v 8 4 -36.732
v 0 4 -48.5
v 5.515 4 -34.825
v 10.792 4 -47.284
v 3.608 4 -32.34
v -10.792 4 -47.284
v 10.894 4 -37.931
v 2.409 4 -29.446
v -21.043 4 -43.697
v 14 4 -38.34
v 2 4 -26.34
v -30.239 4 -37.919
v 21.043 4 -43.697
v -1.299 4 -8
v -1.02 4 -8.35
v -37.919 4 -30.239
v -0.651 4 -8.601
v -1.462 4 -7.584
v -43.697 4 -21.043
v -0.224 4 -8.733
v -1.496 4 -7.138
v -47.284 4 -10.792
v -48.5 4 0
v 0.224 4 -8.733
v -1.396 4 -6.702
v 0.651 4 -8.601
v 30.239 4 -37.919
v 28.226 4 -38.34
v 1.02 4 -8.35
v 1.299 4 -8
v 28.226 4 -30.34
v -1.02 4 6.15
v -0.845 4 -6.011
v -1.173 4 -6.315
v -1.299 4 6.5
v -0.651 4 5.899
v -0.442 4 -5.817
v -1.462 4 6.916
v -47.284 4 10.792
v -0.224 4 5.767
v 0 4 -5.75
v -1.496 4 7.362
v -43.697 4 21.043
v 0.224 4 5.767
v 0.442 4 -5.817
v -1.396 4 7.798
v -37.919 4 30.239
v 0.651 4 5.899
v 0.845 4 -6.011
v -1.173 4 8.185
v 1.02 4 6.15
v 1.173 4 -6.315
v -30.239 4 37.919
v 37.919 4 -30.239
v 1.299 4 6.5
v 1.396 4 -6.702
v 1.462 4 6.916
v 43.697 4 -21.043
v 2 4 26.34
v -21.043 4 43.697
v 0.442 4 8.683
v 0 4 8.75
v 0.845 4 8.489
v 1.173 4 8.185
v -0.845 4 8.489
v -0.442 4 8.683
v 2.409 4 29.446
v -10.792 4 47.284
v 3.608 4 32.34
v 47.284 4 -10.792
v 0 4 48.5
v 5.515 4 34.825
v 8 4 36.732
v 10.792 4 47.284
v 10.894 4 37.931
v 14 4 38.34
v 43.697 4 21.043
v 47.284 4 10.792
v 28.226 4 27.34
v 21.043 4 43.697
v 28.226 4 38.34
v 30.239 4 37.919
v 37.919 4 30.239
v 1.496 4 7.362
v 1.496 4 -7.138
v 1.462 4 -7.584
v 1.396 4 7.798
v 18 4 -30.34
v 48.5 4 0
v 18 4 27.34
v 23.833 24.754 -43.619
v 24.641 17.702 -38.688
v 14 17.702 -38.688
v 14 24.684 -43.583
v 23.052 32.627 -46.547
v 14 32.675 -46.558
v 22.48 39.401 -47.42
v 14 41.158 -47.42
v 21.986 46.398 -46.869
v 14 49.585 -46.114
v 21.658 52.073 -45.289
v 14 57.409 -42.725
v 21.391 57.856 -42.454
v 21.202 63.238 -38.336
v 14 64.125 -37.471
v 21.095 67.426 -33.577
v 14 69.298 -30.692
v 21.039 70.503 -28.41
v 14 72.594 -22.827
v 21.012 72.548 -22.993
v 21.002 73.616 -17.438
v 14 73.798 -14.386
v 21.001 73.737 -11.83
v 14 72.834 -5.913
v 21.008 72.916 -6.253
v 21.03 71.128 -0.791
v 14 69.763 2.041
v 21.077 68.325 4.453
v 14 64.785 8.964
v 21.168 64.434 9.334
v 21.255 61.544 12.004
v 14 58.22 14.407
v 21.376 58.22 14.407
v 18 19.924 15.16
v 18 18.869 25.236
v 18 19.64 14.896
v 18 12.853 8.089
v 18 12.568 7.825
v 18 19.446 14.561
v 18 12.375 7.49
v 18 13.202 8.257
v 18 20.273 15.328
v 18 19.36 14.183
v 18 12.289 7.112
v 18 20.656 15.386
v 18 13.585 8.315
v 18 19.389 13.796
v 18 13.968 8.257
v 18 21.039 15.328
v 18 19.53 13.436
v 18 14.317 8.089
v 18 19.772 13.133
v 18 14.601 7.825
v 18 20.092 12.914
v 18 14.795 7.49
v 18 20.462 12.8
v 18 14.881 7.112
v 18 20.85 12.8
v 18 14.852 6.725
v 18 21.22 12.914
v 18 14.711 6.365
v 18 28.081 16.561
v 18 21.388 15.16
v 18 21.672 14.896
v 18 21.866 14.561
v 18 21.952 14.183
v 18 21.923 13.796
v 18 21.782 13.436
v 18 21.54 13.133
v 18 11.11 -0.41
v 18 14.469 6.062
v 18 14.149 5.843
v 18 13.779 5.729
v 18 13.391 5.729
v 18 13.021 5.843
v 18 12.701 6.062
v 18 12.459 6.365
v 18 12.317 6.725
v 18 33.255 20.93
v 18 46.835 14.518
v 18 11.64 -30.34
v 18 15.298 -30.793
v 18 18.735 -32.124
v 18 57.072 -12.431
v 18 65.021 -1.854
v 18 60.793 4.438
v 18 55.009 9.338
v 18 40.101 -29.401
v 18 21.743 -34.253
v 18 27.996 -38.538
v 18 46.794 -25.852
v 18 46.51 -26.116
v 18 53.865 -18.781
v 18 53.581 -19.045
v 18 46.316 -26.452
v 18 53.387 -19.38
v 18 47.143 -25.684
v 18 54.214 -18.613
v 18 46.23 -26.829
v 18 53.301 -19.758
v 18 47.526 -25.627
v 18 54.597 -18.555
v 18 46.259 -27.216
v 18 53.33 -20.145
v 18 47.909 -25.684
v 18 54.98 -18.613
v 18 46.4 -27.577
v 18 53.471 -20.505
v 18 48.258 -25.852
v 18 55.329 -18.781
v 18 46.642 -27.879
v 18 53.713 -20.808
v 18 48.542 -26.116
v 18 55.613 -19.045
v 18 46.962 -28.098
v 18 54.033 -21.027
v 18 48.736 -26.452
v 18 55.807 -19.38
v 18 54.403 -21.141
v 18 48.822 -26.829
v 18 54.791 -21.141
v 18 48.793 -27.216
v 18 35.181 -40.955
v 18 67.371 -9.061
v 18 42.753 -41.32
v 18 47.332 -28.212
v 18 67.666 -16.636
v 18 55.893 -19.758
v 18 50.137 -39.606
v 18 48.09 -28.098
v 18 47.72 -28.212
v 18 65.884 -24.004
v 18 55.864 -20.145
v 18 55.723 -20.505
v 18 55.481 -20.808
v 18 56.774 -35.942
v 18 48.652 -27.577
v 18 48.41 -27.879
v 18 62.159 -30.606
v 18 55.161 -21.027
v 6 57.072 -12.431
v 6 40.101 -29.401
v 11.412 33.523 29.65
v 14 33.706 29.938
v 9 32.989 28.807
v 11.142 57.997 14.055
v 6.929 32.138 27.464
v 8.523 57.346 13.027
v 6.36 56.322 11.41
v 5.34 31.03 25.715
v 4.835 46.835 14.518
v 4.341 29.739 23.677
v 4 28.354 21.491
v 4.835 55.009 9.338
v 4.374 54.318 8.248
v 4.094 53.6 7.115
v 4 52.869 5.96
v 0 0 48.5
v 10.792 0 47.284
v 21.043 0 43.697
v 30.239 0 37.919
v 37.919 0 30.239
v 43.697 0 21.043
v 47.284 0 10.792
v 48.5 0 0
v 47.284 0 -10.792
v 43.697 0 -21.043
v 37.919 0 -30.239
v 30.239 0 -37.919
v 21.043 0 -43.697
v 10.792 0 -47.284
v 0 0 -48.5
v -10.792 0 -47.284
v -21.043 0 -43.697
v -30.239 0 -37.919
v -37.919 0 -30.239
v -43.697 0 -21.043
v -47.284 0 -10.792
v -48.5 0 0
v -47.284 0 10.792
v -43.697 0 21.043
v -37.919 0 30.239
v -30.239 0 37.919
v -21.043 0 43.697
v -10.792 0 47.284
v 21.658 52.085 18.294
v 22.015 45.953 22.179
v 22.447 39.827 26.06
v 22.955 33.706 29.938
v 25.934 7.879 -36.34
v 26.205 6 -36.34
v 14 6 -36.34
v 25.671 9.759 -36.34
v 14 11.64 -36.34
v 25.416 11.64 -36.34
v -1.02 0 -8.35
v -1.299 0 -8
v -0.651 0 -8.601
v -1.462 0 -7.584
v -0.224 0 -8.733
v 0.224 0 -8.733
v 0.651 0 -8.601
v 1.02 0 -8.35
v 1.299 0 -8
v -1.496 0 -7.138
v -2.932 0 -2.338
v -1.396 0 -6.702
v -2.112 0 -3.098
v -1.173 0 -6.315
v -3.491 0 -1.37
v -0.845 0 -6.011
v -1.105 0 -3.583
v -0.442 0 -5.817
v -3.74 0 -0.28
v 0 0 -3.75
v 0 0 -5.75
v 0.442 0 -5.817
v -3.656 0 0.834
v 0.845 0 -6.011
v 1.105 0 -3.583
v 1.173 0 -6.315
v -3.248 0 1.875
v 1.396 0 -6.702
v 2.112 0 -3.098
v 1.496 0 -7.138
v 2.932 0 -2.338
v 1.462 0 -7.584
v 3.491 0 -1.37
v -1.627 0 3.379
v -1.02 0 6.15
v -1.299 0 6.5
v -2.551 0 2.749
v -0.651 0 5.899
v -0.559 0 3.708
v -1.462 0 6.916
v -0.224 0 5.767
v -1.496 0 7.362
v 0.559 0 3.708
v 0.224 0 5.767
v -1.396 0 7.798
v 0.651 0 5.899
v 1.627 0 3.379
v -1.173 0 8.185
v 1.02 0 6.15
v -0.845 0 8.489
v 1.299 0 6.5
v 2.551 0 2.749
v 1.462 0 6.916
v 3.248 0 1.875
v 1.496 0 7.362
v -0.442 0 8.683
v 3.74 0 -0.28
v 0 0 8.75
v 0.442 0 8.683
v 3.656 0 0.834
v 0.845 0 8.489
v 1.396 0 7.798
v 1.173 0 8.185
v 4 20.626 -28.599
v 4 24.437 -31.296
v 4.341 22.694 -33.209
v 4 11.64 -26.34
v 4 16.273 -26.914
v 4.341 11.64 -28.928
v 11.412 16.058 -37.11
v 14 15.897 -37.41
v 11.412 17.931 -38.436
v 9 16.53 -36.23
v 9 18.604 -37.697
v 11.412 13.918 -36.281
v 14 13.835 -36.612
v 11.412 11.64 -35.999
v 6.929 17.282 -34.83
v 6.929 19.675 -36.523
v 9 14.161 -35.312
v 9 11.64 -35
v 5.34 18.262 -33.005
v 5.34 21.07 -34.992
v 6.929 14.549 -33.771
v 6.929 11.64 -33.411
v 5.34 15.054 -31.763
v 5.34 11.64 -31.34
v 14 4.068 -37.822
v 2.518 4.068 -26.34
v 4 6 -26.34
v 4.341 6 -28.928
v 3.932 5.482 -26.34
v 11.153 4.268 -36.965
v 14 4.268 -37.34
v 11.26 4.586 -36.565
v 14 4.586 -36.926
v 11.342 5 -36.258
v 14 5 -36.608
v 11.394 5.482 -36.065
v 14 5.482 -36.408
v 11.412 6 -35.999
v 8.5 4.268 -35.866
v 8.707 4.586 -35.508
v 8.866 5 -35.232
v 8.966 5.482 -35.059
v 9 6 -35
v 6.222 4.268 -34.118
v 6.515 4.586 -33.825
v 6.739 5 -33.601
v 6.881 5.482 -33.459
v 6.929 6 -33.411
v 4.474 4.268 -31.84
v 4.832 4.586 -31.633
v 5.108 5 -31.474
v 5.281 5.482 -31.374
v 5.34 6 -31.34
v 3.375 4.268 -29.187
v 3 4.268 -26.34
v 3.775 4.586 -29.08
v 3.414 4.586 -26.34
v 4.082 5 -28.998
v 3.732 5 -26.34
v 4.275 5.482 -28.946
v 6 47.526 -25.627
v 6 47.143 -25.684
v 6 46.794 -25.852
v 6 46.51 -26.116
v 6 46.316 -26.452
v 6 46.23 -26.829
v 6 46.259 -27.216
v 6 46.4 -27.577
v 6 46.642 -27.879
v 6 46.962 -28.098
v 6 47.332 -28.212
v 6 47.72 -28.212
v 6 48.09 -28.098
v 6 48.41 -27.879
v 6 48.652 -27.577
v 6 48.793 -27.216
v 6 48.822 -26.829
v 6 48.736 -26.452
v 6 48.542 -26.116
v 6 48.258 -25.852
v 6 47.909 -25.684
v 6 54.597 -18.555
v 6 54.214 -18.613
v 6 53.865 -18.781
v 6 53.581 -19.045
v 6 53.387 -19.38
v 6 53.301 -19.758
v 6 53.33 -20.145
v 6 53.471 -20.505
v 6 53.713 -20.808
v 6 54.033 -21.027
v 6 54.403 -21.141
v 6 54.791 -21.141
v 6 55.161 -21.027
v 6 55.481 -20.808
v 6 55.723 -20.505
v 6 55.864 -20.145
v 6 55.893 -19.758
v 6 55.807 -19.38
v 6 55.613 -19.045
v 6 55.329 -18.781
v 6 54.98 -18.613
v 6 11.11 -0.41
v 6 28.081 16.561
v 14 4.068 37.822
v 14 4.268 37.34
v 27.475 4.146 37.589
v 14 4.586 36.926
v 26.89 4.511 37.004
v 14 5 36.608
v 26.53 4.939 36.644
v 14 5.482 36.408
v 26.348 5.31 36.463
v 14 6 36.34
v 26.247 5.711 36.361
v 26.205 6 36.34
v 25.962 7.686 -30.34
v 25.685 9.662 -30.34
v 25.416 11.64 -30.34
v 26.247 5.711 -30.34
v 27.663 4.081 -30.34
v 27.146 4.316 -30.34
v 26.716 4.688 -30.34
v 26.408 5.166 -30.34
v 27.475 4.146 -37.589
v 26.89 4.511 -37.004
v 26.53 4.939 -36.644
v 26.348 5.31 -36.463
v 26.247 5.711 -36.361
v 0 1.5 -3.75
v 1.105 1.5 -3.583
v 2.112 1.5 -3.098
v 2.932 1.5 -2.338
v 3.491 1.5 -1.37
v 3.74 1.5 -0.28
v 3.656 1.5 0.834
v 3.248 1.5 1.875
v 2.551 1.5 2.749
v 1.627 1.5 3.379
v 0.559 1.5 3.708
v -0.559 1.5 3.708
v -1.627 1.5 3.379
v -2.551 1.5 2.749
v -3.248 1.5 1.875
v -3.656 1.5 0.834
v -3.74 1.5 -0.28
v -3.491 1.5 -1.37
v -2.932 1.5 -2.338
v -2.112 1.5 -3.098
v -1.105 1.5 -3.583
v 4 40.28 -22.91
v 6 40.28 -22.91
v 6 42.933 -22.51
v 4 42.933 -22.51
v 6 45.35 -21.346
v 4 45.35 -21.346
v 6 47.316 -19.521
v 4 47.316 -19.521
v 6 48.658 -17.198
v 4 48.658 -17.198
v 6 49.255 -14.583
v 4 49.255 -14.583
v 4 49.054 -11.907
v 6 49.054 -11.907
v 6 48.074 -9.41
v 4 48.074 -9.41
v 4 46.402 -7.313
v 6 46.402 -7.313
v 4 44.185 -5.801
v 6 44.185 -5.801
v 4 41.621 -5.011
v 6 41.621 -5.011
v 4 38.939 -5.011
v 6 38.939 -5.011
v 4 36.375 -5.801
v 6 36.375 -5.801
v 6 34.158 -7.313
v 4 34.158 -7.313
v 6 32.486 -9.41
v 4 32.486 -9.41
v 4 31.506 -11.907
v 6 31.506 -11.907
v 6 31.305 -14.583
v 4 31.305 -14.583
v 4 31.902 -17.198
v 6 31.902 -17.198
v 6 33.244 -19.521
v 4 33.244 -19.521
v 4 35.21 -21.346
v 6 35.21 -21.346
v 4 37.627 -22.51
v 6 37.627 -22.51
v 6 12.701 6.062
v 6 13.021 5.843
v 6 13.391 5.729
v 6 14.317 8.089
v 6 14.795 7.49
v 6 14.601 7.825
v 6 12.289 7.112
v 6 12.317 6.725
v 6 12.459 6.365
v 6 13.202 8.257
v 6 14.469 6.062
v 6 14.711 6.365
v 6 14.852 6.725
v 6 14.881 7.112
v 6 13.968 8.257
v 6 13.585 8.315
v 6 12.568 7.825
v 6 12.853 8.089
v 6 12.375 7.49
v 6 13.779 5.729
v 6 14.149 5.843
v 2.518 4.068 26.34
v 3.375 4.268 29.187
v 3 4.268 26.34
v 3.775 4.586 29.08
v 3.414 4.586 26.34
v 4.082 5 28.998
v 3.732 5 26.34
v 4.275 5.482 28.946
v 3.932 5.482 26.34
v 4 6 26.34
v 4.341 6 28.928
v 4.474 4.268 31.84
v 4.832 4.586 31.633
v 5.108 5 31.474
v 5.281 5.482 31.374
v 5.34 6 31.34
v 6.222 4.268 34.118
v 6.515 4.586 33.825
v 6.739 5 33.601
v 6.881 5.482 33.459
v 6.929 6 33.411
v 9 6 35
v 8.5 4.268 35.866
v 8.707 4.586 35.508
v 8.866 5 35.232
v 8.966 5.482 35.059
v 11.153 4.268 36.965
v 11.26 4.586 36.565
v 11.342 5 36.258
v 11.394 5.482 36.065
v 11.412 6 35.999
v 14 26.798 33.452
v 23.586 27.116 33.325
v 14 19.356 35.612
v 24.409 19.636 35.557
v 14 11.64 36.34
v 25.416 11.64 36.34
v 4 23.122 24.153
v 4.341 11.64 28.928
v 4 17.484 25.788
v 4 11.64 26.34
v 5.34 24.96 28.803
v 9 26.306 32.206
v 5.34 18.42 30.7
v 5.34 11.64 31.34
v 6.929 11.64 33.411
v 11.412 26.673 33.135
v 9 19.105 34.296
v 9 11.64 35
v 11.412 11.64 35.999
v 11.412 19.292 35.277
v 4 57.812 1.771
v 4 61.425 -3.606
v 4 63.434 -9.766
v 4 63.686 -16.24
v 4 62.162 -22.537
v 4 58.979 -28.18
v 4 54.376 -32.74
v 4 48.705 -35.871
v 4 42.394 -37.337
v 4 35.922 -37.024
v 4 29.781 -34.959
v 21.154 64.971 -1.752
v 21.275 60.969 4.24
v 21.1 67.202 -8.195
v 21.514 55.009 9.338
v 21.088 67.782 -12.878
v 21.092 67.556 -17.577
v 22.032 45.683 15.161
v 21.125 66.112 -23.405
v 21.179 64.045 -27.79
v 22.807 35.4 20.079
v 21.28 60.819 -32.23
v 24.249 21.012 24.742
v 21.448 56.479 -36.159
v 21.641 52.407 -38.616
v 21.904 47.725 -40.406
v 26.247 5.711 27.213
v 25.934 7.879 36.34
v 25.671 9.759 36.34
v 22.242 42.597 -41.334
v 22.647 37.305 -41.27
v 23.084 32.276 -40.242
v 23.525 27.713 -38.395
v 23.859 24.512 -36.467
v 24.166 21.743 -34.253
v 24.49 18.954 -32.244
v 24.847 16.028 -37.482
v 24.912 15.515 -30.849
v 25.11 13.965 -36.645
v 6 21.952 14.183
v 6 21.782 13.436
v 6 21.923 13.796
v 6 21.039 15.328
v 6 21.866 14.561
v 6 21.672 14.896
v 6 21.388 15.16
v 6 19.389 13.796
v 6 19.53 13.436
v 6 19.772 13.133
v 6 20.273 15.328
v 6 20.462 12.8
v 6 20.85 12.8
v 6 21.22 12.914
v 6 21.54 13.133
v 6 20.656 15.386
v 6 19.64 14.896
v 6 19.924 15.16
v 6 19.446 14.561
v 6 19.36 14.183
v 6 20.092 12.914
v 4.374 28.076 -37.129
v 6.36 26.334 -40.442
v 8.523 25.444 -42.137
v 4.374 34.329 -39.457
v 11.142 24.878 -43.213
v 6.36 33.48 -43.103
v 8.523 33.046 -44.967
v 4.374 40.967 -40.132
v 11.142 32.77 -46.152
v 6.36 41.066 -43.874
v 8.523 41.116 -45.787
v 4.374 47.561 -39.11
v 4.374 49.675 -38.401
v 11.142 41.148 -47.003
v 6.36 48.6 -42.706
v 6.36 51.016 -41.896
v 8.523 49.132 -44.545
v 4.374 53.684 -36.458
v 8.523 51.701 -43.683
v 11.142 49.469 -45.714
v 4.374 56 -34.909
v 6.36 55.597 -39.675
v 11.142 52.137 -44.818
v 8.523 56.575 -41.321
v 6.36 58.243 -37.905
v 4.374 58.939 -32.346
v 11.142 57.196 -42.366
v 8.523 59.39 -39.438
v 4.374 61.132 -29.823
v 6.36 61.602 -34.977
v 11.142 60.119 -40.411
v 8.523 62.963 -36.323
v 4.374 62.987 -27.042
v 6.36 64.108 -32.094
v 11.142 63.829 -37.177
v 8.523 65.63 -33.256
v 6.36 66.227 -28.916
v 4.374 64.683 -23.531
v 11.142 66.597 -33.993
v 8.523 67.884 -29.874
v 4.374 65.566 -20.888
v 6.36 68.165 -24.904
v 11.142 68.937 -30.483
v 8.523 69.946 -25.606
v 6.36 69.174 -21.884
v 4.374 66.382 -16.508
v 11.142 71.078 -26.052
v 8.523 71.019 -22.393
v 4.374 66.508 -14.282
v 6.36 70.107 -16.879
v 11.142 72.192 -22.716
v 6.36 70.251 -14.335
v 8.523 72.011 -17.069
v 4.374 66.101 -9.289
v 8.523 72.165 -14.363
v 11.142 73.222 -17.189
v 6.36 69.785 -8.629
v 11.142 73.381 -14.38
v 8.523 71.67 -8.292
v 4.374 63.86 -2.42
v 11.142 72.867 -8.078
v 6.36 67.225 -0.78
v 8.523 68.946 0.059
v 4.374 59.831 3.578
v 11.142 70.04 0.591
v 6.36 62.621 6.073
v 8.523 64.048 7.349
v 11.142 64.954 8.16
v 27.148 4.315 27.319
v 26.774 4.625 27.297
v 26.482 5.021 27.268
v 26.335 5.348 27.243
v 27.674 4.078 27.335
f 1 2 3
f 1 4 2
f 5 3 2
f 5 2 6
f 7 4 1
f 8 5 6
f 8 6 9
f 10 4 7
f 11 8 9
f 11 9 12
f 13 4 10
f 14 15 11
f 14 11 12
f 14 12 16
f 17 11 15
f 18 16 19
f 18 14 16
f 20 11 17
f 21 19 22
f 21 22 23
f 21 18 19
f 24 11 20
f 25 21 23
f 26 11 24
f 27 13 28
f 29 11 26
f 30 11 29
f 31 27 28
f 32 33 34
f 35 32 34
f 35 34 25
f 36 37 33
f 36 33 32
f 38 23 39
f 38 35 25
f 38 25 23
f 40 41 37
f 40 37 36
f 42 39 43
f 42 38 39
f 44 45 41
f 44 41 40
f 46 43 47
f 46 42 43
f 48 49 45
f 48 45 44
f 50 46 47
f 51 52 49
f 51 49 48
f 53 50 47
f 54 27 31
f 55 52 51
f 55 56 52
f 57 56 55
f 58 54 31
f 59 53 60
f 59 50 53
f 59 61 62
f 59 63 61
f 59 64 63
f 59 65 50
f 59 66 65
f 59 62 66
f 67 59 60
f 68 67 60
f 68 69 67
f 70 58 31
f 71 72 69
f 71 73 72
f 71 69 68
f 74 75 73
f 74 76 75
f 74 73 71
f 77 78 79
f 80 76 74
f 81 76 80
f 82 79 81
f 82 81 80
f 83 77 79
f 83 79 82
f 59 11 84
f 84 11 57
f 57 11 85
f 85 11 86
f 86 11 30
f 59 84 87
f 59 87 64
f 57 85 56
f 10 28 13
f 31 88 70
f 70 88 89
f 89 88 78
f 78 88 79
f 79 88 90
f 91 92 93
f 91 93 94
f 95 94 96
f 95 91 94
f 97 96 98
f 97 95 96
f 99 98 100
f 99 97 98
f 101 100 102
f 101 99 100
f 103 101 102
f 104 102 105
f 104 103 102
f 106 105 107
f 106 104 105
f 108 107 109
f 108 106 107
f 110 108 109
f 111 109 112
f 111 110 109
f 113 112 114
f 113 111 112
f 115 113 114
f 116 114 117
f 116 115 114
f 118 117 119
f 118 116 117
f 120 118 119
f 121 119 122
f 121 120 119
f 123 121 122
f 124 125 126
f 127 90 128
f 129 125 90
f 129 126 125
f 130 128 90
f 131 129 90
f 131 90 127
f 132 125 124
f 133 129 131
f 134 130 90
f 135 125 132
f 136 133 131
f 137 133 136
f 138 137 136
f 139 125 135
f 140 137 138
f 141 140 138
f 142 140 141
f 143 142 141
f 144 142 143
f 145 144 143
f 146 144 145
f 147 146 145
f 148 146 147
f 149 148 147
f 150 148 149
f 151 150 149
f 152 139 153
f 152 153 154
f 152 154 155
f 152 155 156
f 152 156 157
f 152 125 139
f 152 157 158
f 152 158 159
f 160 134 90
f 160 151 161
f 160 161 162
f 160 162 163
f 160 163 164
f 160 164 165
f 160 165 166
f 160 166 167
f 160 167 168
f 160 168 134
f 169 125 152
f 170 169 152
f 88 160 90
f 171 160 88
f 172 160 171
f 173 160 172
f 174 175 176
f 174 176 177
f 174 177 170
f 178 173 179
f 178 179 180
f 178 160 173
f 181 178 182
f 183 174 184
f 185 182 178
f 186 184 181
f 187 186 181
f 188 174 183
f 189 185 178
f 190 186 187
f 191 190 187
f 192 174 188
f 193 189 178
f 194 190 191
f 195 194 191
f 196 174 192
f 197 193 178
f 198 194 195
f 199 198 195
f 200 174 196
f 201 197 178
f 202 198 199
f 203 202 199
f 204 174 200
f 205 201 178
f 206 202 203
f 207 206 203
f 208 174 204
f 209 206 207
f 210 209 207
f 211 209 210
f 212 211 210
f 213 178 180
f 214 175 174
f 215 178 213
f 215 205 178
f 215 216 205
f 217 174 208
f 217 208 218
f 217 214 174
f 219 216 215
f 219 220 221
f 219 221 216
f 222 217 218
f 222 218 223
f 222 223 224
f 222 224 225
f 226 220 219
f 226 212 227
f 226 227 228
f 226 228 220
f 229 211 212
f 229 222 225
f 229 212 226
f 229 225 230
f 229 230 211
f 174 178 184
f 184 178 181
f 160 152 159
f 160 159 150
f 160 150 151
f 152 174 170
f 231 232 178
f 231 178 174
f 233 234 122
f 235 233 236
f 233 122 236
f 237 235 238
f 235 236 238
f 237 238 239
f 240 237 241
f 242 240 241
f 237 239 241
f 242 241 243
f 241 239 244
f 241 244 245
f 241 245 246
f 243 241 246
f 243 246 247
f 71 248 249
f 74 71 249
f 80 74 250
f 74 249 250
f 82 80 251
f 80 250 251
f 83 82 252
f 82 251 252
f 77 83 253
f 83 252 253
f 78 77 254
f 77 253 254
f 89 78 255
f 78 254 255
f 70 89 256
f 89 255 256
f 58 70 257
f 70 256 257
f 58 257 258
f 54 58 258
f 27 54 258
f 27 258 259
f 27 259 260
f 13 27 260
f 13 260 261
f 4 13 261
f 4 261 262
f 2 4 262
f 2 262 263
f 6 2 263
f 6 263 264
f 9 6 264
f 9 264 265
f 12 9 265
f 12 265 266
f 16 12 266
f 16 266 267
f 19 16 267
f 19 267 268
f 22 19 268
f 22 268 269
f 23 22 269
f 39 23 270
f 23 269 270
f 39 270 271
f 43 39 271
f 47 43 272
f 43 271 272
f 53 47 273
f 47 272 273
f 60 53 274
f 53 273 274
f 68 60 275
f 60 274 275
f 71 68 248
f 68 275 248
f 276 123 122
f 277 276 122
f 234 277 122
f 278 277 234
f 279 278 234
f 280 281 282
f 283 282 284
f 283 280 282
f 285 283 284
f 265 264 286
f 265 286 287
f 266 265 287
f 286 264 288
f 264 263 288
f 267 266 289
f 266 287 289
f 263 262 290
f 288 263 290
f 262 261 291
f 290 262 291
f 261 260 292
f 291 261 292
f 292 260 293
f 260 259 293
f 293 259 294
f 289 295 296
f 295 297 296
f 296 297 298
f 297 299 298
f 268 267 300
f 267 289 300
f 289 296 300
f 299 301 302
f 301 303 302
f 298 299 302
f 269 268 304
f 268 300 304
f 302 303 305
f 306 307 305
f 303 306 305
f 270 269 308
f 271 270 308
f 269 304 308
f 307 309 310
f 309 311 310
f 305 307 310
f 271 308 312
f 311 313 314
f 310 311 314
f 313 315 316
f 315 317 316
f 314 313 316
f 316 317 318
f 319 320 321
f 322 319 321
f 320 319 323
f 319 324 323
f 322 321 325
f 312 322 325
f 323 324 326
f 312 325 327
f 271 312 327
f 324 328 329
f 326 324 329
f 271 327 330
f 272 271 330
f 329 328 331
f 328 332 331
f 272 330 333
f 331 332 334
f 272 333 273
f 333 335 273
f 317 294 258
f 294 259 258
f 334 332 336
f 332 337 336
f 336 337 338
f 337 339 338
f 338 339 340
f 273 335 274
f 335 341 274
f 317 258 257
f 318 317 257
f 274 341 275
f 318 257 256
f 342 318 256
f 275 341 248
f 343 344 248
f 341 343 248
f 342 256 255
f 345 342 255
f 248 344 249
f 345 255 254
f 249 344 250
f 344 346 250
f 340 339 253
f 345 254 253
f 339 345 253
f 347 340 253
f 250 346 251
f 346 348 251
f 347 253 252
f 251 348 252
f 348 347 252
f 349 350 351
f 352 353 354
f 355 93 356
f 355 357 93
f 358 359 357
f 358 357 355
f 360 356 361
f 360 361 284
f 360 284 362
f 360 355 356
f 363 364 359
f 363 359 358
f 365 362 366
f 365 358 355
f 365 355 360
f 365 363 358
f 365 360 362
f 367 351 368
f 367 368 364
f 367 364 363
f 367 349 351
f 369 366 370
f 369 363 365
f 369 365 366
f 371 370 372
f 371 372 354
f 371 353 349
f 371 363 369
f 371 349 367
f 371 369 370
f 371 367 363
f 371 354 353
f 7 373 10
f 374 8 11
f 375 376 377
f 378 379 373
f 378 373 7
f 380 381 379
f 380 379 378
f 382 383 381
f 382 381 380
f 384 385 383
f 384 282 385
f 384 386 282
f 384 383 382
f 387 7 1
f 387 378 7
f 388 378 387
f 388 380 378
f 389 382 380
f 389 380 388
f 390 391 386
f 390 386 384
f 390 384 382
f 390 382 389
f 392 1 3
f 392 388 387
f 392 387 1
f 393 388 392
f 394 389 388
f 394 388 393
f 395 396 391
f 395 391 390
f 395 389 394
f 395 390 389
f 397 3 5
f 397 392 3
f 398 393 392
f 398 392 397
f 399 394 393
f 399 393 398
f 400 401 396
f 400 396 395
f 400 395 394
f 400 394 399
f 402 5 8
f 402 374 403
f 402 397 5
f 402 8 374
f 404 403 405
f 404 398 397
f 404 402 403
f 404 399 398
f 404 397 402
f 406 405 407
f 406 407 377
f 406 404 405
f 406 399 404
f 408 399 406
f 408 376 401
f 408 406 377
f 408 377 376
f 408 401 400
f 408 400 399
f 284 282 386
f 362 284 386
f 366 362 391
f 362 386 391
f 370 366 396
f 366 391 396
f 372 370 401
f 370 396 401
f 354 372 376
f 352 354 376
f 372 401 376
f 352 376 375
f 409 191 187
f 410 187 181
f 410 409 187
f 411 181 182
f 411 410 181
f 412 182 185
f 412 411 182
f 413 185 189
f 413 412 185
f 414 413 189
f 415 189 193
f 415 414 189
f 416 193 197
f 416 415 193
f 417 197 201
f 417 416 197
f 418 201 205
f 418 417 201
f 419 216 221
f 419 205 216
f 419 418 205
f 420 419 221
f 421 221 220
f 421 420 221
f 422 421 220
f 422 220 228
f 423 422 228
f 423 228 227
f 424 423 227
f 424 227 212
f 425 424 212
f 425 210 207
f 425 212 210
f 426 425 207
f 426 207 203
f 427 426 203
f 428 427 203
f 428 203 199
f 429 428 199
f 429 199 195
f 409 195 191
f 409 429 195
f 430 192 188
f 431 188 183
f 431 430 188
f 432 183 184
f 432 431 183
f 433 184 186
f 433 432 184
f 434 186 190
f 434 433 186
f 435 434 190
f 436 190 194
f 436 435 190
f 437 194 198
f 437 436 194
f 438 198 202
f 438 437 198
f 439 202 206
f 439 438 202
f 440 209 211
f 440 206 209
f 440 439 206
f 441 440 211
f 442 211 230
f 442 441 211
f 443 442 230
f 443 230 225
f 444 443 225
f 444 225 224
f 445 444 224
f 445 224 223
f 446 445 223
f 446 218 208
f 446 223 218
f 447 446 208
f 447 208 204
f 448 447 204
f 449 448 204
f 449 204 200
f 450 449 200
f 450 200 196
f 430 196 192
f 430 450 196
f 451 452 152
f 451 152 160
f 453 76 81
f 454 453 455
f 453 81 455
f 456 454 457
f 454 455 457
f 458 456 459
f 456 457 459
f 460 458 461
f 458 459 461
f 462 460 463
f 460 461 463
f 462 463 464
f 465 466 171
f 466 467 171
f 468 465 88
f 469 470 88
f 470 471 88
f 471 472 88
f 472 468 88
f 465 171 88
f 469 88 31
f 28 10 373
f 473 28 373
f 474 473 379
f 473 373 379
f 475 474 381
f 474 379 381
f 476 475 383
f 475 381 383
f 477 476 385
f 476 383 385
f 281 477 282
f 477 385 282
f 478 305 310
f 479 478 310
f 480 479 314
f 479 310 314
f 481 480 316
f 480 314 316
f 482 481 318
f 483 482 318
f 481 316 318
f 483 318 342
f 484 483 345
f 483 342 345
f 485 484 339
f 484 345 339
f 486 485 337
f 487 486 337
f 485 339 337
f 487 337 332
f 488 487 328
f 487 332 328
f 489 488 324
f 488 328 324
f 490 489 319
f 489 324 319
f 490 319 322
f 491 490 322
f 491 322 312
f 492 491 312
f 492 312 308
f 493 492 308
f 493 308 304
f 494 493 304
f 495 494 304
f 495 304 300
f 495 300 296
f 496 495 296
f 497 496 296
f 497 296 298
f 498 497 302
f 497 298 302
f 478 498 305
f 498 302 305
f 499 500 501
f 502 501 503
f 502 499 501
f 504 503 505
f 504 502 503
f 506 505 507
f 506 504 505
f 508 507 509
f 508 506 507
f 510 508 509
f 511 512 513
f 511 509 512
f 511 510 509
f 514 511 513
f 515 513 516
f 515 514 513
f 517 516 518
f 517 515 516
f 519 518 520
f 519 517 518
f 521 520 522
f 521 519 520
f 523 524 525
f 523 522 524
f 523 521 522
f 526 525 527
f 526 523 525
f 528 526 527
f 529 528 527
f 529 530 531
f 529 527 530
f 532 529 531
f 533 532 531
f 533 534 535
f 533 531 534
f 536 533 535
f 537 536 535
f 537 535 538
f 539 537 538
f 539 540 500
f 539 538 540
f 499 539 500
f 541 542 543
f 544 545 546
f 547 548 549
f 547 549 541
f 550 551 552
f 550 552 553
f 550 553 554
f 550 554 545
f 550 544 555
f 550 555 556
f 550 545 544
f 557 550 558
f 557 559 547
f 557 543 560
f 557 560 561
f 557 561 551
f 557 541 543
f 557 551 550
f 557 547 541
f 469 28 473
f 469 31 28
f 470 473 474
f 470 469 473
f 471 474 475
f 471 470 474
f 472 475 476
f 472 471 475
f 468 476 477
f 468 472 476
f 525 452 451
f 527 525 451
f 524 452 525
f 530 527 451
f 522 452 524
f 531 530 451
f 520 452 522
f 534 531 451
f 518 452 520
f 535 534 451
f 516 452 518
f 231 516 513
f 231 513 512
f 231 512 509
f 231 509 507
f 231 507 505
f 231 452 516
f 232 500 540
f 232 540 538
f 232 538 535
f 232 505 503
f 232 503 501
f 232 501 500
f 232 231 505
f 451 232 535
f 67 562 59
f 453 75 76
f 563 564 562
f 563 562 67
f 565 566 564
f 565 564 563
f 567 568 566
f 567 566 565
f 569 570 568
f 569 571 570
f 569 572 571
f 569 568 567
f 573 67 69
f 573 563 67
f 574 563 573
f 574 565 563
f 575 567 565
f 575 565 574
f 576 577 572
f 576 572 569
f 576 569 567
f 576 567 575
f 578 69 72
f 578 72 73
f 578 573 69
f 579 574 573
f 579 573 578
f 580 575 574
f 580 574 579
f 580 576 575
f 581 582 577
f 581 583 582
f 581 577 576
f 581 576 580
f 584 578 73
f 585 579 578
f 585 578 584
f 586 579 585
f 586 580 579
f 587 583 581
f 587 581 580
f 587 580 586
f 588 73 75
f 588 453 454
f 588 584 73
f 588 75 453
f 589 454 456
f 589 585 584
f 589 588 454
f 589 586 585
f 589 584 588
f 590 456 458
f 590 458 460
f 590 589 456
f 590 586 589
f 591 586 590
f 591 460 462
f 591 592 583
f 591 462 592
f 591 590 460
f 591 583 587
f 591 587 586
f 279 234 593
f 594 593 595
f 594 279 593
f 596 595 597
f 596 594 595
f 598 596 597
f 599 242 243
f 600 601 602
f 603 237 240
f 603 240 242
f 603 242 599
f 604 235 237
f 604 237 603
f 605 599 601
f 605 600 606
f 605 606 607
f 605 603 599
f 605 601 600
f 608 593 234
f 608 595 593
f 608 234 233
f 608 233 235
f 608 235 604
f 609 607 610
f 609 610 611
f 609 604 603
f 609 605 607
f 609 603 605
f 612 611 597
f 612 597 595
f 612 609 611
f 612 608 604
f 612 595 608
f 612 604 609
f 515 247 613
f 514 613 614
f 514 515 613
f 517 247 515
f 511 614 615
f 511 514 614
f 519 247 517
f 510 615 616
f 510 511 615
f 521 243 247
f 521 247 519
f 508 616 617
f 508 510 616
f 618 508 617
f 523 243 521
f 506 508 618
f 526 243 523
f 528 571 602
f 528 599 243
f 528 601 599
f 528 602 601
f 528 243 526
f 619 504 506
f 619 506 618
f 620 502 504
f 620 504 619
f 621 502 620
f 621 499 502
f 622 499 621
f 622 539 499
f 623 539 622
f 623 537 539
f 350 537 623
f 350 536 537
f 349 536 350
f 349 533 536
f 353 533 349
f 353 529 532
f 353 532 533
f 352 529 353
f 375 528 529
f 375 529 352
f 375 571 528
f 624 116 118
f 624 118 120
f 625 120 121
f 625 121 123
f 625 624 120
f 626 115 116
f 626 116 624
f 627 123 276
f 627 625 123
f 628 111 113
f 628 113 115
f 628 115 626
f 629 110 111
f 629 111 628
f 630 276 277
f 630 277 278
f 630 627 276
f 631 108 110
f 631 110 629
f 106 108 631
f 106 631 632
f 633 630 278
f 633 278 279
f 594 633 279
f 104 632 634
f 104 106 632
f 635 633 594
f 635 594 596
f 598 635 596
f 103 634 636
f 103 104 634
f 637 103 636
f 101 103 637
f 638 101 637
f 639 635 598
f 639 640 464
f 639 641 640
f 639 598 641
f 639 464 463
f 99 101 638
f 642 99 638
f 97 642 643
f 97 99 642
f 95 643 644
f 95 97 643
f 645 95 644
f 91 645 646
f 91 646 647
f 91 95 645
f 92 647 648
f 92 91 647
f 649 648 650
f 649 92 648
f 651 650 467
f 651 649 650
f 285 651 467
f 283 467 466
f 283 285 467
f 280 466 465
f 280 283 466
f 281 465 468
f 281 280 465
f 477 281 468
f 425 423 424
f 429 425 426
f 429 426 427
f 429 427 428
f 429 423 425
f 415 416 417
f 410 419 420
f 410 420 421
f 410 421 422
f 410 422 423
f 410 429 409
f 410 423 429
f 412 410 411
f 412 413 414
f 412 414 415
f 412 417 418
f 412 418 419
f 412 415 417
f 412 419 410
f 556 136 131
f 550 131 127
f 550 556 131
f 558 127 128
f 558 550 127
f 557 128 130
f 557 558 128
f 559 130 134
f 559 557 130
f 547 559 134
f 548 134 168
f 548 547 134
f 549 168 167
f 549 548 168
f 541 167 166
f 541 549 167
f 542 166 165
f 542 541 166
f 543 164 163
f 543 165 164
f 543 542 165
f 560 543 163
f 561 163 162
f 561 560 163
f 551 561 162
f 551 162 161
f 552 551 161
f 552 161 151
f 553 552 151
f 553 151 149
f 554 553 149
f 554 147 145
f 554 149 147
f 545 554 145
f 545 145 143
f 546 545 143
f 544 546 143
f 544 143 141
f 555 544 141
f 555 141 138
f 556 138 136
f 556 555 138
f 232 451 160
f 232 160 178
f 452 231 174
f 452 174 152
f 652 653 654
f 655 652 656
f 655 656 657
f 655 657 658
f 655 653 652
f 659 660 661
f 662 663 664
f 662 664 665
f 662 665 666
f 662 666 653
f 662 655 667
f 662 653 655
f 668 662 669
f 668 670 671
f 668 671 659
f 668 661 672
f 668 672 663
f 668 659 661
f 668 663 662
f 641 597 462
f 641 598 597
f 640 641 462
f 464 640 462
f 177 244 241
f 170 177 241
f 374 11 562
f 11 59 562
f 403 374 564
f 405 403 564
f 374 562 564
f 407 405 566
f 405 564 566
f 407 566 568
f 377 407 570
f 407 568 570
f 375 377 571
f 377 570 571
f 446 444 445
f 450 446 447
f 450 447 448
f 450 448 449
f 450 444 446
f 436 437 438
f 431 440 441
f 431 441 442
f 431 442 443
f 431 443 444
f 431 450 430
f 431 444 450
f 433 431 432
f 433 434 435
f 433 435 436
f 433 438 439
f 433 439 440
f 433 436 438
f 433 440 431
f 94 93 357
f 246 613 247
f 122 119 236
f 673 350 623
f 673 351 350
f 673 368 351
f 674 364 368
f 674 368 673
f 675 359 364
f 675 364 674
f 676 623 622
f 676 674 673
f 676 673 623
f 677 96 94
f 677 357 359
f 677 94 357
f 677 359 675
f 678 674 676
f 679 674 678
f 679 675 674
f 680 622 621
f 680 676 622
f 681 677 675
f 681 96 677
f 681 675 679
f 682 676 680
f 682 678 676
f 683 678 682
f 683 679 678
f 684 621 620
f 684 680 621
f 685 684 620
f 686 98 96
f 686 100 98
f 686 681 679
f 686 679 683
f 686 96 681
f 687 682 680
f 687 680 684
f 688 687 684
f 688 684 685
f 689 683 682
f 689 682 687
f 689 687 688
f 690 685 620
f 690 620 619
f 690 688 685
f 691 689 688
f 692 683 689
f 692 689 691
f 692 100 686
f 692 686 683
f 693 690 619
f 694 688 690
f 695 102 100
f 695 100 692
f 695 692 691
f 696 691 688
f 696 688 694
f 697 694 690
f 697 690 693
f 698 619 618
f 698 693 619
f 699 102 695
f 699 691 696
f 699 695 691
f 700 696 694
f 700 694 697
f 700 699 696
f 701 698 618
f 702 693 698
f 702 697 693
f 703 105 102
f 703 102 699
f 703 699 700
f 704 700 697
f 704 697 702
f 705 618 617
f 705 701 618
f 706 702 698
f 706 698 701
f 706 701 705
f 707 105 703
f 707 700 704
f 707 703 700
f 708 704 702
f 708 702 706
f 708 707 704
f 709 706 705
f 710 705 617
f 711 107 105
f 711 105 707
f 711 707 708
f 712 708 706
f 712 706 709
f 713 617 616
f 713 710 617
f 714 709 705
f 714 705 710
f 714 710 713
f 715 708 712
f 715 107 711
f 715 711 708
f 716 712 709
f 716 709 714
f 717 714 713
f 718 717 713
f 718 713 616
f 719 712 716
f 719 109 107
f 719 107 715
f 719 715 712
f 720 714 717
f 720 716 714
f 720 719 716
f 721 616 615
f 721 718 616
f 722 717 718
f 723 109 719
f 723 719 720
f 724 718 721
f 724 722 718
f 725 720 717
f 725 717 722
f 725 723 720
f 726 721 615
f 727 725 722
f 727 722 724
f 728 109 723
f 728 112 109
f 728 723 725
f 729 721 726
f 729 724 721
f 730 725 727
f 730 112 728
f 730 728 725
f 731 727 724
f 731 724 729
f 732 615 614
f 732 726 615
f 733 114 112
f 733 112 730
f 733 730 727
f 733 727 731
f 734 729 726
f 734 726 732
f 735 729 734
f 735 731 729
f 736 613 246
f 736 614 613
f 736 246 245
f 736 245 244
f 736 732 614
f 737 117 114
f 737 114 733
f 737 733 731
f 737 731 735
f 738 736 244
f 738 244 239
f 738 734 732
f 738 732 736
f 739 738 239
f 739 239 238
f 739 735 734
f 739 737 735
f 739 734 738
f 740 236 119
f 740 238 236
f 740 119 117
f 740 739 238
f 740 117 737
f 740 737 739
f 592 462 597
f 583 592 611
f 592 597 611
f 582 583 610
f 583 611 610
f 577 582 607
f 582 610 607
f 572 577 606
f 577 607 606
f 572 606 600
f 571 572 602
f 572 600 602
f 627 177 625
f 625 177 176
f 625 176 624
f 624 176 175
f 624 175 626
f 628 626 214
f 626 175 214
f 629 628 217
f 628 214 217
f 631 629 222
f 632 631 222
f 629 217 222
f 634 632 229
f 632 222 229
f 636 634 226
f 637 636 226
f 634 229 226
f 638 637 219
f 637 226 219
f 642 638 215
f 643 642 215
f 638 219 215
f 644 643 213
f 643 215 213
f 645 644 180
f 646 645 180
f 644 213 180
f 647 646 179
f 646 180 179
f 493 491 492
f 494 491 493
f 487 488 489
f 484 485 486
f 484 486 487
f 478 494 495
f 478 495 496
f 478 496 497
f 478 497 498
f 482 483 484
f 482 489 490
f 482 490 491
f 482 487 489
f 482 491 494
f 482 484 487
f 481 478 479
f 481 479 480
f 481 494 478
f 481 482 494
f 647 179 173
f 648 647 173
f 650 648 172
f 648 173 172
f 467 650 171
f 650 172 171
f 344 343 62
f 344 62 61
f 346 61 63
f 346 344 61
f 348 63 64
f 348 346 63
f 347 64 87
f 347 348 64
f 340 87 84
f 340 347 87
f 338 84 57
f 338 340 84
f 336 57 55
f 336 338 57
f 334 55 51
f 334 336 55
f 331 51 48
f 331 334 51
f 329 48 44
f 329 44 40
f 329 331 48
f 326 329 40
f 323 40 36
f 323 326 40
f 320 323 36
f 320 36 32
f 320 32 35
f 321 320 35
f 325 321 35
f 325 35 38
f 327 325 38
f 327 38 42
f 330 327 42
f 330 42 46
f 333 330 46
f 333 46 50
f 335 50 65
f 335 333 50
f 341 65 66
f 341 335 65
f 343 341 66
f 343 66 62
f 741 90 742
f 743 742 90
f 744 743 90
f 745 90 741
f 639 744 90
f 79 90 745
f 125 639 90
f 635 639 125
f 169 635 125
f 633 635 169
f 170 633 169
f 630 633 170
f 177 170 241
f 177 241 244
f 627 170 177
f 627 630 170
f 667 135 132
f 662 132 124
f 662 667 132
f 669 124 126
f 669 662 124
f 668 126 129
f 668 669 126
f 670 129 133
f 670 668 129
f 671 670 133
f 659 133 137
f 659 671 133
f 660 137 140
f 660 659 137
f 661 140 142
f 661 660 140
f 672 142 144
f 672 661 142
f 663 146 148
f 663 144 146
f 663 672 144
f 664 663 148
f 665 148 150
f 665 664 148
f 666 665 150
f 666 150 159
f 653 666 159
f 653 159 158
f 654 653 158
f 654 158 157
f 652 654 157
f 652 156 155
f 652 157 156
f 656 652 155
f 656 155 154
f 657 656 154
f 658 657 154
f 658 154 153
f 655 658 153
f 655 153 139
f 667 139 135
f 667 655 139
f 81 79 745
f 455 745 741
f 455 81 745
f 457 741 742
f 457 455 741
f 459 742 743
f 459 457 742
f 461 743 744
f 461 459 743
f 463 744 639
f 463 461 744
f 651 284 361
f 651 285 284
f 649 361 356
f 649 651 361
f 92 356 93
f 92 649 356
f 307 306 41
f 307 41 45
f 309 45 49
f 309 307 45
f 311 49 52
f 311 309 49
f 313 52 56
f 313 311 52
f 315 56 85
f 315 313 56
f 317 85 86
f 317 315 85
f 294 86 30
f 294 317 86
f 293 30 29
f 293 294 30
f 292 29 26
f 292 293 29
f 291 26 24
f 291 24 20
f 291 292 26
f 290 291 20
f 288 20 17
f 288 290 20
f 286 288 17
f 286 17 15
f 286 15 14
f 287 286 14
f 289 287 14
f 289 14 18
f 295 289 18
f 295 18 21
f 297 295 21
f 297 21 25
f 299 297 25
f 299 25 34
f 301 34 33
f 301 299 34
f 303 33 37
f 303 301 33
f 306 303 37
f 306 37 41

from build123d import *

# Parameters (mm, degrees)
SKETCH1_R                       = 48.5
SKETCH1_R_2                     = 1.5
BOSS_EXTRUDE1_DEPTH             = 4
SKETCH6_R                       = 3.75
CUT_EXTRUDE15_DEPTH             = 1.5
BOSS_EXTRUDE3_START             = 4
SKETCH5_R                       = 9
BOSS_EXTRUDE3_DEPTH             = 14
CUT_EXTRUDE16_START             = 6
SKETCH9_R                       = 1.3
CUT_EXTRUDE16_DEPTH             = 91.444646155
BOSS_EXTRUDE4_DEPTH             = 9
BOSS_EXTRUDE4_DIRECTION_2_REACH = 108.638
CUT_EXTRUDE17_DEPTH             = 101.75311462
CUT_EXTRUDE17_DEPTH_BACK        = 101.75311462
FILLET2_R                       = 10
FILLET3_R                       = 2


with BuildPart() as part:
    # Sketch1 → Boss-Extrude1 (new body)
    with BuildSketch(Plane(origin=(0, 0, 0), x_dir=(1, 0, 0), z_dir=(0, 1, 0))):
        with Locations(Location((0, 0, 0), (0, 0, 270))):
            Circle(SKETCH1_R)
        with Locations(Location((0, 7.25, 0), (0, 0, 270))):
            Circle(SKETCH1_R_2, mode=Mode.SUBTRACT)
        with Locations(Location((0, -7.25, 0), (0, 0, 270))):
            Circle(SKETCH1_R_2, mode=Mode.SUBTRACT)
    extrude(amount=BOSS_EXTRUDE1_DEPTH)

    # Sketch6 → Cut-Extrude15 (cut)
    with BuildSketch(Plane.XZ):
        with Locations(Location((0, 0, 0), (0, 0, 270))):
            Circle(SKETCH6_R)
    extrude(amount=-CUT_EXTRUDE15_DEPTH, mode=Mode.SUBTRACT)

    # Sketch5 → Boss-Extrude3 (add)
    with BuildSketch(Plane(origin=(0, 0, 0), x_dir=(0, 0, -1), z_dir=(1, 0, 0)).offset(BOSS_EXTRUDE3_START)):
        with BuildLine():
            Line((-30.34, 4), (30.34, 4))
            Line((30.34, 4), (30.34, 11.64))
            ThreePointArc((30.34, 11.64), (31.352340729, 17.057138369), (34.252718415, 21.743078098))
            ThreePointArc((34.252718415, 21.743078098), (30.606439261, 62.158587297), (-9.338476496, 55.009290775))
            Line((-9.338476496, 55.009290775), (-24.869934587, 30.494686245))
            ThreePointArc((-24.869934587, 30.494686245), (-28.94485921, 21.456068574), (-30.34, 11.64))
            Line((-30.34, 11.64), (-30.34, 4))
        make_face()
        with Locations((13.91, 40.28)):
            Circle(SKETCH5_R, mode=Mode.SUBTRACT)
    extrude(amount=BOSS_EXTRUDE3_DEPTH)

    # Sketch9 → Cut-Extrude16 (cut, through all)
    with BuildSketch(Plane(origin=(0, 0, 0), x_dir=(0, 0, -1), z_dir=(1, 0, 0)).offset(CUT_EXTRUDE16_START)):
        with Locations(Location((26.926504294, 47.525999231, 0), (0, 0, 180))):
            Circle(SKETCH9_R)
        with Locations(Location((19.855436483, 54.597067043, 0), (0, 0, 180))):
            Circle(SKETCH9_R)
        with Locations(Location((-7.014621202, 13.584873734, 0), (0, 0, 180))):
            Circle(SKETCH9_R)
        with Locations(Location((-14.085689014, 20.655941546, 0), (0, 0, 180))):
            Circle(SKETCH9_R)
        Polygon((0.41, 11.11), (29.401378029, 40.101378029), (12.43081528, 57.071940777), (-16.560562748, 28.080562748), align=None)
    extrude(amount=CUT_EXTRUDE16_DEPTH, mode=Mode.SUBTRACT)

    # Sketch10 → Boss-Extrude4 (add)
    with BuildSketch(Plane(origin=(18, 0, 0), x_dir=(0, 0, -1), z_dir=(1, 0, 0))):
        with BuildLine():
            Line((36.34, 4), (36.34, 11.64))
            ThreePointArc((36.34, 11.64), (36.947404437, 14.890283021), (38.687631049, 17.701846859))
            ThreePointArc((38.687631049, 17.701846859), (34.246427187, 66.928334449), (-14.406872962, 58.22042099))
            Line((-14.406872962, 58.22042099), (-29.938331054, 33.705816459))
            ThreePointArc((-29.938331054, 33.705816459), (-34.707253625, 23.127837278), (-36.34, 11.64))
            Line((-36.34, 11.64), (-36.34, 4))
            Line((-36.34, 4), (-27.34, 4))
            ThreePointArc((-27.34, 4), (-21.853757974, 30.744943155), (-9.338476496, 55.009290775))
            ThreePointArc((-9.338476496, 55.009290775), (30.606439261, 62.158587297), (34.252718415, 21.743078098))
            ThreePointArc((34.252718415, 21.743078098), (31.352340729, 17.057138369), (30.34, 11.64))
            Line((30.34, 11.64), (30.34, 4))
            Line((30.34, 4), (36.34, 4))
        make_face()
    extrude(amount=BOSS_EXTRUDE4_DEPTH)

    # Boss-Extrude4 direction 2: up to this face of the body (flat: up to its plane)
    boss_extrude4_direction_2_end = Plane(part.part.faces().sort_by_distance((4, 32.000082857, -6.789790598))[0])
    # Sketch10 → Boss-Extrude4 direction 2 (add, up to the picked face)
    with BuildSketch(Plane(origin=(18, 0, 0), x_dir=(0, 0, -1), z_dir=(1, 0, 0)), mode=Mode.PRIVATE) as boss_extrude4_direction_2_sk1:
        with BuildLine():
            Line((36.34, 4), (36.34, 11.64))
            ThreePointArc((36.34, 11.64), (36.947404437, 14.890283021), (38.687631049, 17.701846859))
            ThreePointArc((38.687631049, 17.701846859), (34.246427187, 66.928334449), (-14.406872962, 58.22042099))
            Line((-14.406872962, 58.22042099), (-29.938331054, 33.705816459))
            ThreePointArc((-29.938331054, 33.705816459), (-34.707253625, 23.127837278), (-36.34, 11.64))
            Line((-36.34, 11.64), (-36.34, 4))
            Line((-36.34, 4), (-27.34, 4))
            ThreePointArc((-27.34, 4), (-21.853757974, 30.744943155), (-9.338476496, 55.009290775))
            ThreePointArc((-9.338476496, 55.009290775), (30.606439261, 62.158587297), (34.252718415, 21.743078098))
            ThreePointArc((34.252718415, 21.743078098), (31.352340729, 17.057138369), (30.34, 11.64))
            Line((30.34, 11.64), (30.34, 4))
            Line((30.34, 4), (36.34, 4))
        make_face()
    boss_extrude4_direction_2_tool1 = split(extrude(boss_extrude4_direction_2_sk1.sketch, amount=-BOSS_EXTRUDE4_DIRECTION_2_REACH, mode=Mode.PRIVATE), bisect_by=boss_extrude4_direction_2_end, keep=Keep.BOTH, mode=Mode.PRIVATE)
    add(boss_extrude4_direction_2_tool1.solids().sort_by(Axis((18, 63.025419, -31.267953), (-1, 0, 0)))[0])

    # Sketch11 → Cut-Extrude17 (cut, two sides: drawn at the far end of the back side and taken through both)
    with BuildSketch(Plane.XY.offset(-CUT_EXTRUDE17_DEPTH_BACK)):
        with BuildLine():
            Line((27, 73.801694463), (21, 73.801694463))
            ThreePointArc((21, 73.801694463), (22.52665425, 38.804454133), (26.5, 4))
            Line((26.5, 4), (27, 4))
            Line((27, 4), (27, 73.801694463))
        make_face()
    extrude(amount=CUT_EXTRUDE17_DEPTH + CUT_EXTRUDE17_DEPTH_BACK, mode=Mode.SUBTRACT)

    # Fillet2
    # the kernel refuses this fillet: 10 mm, written as the material it takes off along each edge
    with BuildSketch(Plane(origin=(4, 40.28, -13.91), x_dir=(0, -0.6735385398377843, -0.7391521056948872), z_dir=(0, -0.7391521056948872, 0.6735385398377843))) as fillet2_piece_1:
        with BuildLine():
            CenterArc((33.521694463 - FILLET2_R, FILLET2_R), FILLET2_R, 270, 90)
            Line((33.521694463, FILLET2_R), (33.521694463, 0))
            Line((33.521694463, 0), (33.521694463 - FILLET2_R, 0))
        make_face()
    revolve(axis=Axis((4, 40.28, -13.91), (1, 0, 0)), revolution_arc=189.984074965, mode=Mode.SUBTRACT)
    with BuildSketch(Plane(origin=(4, 58.22042099, 14.406872962), x_dir=(0, -0.5351883691335427, -0.8447327444489049), z_dir=(0, -0.8447327444489049, 0.5351883691335426))) as fillet2_piece_2:
        with BuildLine():
            CenterArc((FILLET2_R, FILLET2_R), FILLET2_R, 180, 90)
            Line((0, FILLET2_R), (0, 0))
            Line((0, 0), (FILLET2_R, 0))
        make_face()
    extrude(amount=29.020544891, mode=Mode.SUBTRACT)
    with BuildSketch(Plane(origin=(4, 11.64, -4.89), x_dir=(0, 0.5351883691335412, 0.8447327444489058), z_dir=(0, 0.8447327444489058, -0.5351883691335412))) as fillet2_piece_3:
        with BuildLine():
            CenterArc((41.23 - FILLET2_R, FILLET2_R), FILLET2_R, 270, 90)
            Line((41.23, FILLET2_R), (41.23, 0))
            Line((41.23, 0), (41.23 - FILLET2_R, 0))
        make_face()
    revolve(axis=Axis((4, 11.64, -4.89), (1, 0, 0)), revolution_arc=32.356687045, mode=Mode.SUBTRACT)
    with BuildSketch(Plane(origin=(4, 11.64, 36.34), x_dir=(0, 0, -1), z_dir=(0, -1, 0)), Plane(origin=(4, 4, -36.34), x_dir=(0, 0, 1), z_dir=(0, 1, 0))) as fillet2_piece_4:
        with BuildLine():
            CenterArc((FILLET2_R, FILLET2_R), FILLET2_R, 180, 90)
            Line((0, FILLET2_R), (0, 0))
            Line((0, 0), (FILLET2_R, 0))
        make_face()
    extrude(amount=7.64, mode=Mode.SUBTRACT)
    with BuildSketch(Plane(origin=(4, 11.64, -45.34), x_dir=(0, 0.6735385398377856, 0.739152105694886), z_dir=(0, 0.739152105694886, -0.6735385398377856))) as fillet2_piece_5:
        with BuildLine():
            CenterArc((9 + FILLET2_R, FILLET2_R), FILLET2_R, 180, 90)
            Line((9, FILLET2_R), (9, 0))
            Line((9, 0), (9 + FILLET2_R, 0))
        make_face()
    revolve(axis=Axis((4, 11.64, -45.34), (1, 0, 0)), revolution_arc=42.340762009, mode=Mode.SUBTRACT)

    # Fillet3
    fillet3_edges = [part.edges().sort_by_distance(p)[0] for p in [
        (20.25, 4, -36.34),
        (20.25, 4, 36.34),
        (6.928932188, 4, 33.411067812),
        (4, 4, 0),
        (6.928932188, 4, -33.411067812),
    ]]
    fillet(fillet3_edges, radius=FILLET3_R)
    fillet3_2_edges = [part.edges().sort_by_distance(p)[0] for p in [
        (26.5, 4, -33.34),
    ]]
    fillet(fillet3_2_edges, radius=FILLET3_R)
    fillet3_3_edges = [part.edges().sort_by_distance(p)[0] for p in [
        (26.5, 4, 31.84),
    ]]
    fillet(fillet3_3_edges, radius=FILLET3_R)


solid = part.part
